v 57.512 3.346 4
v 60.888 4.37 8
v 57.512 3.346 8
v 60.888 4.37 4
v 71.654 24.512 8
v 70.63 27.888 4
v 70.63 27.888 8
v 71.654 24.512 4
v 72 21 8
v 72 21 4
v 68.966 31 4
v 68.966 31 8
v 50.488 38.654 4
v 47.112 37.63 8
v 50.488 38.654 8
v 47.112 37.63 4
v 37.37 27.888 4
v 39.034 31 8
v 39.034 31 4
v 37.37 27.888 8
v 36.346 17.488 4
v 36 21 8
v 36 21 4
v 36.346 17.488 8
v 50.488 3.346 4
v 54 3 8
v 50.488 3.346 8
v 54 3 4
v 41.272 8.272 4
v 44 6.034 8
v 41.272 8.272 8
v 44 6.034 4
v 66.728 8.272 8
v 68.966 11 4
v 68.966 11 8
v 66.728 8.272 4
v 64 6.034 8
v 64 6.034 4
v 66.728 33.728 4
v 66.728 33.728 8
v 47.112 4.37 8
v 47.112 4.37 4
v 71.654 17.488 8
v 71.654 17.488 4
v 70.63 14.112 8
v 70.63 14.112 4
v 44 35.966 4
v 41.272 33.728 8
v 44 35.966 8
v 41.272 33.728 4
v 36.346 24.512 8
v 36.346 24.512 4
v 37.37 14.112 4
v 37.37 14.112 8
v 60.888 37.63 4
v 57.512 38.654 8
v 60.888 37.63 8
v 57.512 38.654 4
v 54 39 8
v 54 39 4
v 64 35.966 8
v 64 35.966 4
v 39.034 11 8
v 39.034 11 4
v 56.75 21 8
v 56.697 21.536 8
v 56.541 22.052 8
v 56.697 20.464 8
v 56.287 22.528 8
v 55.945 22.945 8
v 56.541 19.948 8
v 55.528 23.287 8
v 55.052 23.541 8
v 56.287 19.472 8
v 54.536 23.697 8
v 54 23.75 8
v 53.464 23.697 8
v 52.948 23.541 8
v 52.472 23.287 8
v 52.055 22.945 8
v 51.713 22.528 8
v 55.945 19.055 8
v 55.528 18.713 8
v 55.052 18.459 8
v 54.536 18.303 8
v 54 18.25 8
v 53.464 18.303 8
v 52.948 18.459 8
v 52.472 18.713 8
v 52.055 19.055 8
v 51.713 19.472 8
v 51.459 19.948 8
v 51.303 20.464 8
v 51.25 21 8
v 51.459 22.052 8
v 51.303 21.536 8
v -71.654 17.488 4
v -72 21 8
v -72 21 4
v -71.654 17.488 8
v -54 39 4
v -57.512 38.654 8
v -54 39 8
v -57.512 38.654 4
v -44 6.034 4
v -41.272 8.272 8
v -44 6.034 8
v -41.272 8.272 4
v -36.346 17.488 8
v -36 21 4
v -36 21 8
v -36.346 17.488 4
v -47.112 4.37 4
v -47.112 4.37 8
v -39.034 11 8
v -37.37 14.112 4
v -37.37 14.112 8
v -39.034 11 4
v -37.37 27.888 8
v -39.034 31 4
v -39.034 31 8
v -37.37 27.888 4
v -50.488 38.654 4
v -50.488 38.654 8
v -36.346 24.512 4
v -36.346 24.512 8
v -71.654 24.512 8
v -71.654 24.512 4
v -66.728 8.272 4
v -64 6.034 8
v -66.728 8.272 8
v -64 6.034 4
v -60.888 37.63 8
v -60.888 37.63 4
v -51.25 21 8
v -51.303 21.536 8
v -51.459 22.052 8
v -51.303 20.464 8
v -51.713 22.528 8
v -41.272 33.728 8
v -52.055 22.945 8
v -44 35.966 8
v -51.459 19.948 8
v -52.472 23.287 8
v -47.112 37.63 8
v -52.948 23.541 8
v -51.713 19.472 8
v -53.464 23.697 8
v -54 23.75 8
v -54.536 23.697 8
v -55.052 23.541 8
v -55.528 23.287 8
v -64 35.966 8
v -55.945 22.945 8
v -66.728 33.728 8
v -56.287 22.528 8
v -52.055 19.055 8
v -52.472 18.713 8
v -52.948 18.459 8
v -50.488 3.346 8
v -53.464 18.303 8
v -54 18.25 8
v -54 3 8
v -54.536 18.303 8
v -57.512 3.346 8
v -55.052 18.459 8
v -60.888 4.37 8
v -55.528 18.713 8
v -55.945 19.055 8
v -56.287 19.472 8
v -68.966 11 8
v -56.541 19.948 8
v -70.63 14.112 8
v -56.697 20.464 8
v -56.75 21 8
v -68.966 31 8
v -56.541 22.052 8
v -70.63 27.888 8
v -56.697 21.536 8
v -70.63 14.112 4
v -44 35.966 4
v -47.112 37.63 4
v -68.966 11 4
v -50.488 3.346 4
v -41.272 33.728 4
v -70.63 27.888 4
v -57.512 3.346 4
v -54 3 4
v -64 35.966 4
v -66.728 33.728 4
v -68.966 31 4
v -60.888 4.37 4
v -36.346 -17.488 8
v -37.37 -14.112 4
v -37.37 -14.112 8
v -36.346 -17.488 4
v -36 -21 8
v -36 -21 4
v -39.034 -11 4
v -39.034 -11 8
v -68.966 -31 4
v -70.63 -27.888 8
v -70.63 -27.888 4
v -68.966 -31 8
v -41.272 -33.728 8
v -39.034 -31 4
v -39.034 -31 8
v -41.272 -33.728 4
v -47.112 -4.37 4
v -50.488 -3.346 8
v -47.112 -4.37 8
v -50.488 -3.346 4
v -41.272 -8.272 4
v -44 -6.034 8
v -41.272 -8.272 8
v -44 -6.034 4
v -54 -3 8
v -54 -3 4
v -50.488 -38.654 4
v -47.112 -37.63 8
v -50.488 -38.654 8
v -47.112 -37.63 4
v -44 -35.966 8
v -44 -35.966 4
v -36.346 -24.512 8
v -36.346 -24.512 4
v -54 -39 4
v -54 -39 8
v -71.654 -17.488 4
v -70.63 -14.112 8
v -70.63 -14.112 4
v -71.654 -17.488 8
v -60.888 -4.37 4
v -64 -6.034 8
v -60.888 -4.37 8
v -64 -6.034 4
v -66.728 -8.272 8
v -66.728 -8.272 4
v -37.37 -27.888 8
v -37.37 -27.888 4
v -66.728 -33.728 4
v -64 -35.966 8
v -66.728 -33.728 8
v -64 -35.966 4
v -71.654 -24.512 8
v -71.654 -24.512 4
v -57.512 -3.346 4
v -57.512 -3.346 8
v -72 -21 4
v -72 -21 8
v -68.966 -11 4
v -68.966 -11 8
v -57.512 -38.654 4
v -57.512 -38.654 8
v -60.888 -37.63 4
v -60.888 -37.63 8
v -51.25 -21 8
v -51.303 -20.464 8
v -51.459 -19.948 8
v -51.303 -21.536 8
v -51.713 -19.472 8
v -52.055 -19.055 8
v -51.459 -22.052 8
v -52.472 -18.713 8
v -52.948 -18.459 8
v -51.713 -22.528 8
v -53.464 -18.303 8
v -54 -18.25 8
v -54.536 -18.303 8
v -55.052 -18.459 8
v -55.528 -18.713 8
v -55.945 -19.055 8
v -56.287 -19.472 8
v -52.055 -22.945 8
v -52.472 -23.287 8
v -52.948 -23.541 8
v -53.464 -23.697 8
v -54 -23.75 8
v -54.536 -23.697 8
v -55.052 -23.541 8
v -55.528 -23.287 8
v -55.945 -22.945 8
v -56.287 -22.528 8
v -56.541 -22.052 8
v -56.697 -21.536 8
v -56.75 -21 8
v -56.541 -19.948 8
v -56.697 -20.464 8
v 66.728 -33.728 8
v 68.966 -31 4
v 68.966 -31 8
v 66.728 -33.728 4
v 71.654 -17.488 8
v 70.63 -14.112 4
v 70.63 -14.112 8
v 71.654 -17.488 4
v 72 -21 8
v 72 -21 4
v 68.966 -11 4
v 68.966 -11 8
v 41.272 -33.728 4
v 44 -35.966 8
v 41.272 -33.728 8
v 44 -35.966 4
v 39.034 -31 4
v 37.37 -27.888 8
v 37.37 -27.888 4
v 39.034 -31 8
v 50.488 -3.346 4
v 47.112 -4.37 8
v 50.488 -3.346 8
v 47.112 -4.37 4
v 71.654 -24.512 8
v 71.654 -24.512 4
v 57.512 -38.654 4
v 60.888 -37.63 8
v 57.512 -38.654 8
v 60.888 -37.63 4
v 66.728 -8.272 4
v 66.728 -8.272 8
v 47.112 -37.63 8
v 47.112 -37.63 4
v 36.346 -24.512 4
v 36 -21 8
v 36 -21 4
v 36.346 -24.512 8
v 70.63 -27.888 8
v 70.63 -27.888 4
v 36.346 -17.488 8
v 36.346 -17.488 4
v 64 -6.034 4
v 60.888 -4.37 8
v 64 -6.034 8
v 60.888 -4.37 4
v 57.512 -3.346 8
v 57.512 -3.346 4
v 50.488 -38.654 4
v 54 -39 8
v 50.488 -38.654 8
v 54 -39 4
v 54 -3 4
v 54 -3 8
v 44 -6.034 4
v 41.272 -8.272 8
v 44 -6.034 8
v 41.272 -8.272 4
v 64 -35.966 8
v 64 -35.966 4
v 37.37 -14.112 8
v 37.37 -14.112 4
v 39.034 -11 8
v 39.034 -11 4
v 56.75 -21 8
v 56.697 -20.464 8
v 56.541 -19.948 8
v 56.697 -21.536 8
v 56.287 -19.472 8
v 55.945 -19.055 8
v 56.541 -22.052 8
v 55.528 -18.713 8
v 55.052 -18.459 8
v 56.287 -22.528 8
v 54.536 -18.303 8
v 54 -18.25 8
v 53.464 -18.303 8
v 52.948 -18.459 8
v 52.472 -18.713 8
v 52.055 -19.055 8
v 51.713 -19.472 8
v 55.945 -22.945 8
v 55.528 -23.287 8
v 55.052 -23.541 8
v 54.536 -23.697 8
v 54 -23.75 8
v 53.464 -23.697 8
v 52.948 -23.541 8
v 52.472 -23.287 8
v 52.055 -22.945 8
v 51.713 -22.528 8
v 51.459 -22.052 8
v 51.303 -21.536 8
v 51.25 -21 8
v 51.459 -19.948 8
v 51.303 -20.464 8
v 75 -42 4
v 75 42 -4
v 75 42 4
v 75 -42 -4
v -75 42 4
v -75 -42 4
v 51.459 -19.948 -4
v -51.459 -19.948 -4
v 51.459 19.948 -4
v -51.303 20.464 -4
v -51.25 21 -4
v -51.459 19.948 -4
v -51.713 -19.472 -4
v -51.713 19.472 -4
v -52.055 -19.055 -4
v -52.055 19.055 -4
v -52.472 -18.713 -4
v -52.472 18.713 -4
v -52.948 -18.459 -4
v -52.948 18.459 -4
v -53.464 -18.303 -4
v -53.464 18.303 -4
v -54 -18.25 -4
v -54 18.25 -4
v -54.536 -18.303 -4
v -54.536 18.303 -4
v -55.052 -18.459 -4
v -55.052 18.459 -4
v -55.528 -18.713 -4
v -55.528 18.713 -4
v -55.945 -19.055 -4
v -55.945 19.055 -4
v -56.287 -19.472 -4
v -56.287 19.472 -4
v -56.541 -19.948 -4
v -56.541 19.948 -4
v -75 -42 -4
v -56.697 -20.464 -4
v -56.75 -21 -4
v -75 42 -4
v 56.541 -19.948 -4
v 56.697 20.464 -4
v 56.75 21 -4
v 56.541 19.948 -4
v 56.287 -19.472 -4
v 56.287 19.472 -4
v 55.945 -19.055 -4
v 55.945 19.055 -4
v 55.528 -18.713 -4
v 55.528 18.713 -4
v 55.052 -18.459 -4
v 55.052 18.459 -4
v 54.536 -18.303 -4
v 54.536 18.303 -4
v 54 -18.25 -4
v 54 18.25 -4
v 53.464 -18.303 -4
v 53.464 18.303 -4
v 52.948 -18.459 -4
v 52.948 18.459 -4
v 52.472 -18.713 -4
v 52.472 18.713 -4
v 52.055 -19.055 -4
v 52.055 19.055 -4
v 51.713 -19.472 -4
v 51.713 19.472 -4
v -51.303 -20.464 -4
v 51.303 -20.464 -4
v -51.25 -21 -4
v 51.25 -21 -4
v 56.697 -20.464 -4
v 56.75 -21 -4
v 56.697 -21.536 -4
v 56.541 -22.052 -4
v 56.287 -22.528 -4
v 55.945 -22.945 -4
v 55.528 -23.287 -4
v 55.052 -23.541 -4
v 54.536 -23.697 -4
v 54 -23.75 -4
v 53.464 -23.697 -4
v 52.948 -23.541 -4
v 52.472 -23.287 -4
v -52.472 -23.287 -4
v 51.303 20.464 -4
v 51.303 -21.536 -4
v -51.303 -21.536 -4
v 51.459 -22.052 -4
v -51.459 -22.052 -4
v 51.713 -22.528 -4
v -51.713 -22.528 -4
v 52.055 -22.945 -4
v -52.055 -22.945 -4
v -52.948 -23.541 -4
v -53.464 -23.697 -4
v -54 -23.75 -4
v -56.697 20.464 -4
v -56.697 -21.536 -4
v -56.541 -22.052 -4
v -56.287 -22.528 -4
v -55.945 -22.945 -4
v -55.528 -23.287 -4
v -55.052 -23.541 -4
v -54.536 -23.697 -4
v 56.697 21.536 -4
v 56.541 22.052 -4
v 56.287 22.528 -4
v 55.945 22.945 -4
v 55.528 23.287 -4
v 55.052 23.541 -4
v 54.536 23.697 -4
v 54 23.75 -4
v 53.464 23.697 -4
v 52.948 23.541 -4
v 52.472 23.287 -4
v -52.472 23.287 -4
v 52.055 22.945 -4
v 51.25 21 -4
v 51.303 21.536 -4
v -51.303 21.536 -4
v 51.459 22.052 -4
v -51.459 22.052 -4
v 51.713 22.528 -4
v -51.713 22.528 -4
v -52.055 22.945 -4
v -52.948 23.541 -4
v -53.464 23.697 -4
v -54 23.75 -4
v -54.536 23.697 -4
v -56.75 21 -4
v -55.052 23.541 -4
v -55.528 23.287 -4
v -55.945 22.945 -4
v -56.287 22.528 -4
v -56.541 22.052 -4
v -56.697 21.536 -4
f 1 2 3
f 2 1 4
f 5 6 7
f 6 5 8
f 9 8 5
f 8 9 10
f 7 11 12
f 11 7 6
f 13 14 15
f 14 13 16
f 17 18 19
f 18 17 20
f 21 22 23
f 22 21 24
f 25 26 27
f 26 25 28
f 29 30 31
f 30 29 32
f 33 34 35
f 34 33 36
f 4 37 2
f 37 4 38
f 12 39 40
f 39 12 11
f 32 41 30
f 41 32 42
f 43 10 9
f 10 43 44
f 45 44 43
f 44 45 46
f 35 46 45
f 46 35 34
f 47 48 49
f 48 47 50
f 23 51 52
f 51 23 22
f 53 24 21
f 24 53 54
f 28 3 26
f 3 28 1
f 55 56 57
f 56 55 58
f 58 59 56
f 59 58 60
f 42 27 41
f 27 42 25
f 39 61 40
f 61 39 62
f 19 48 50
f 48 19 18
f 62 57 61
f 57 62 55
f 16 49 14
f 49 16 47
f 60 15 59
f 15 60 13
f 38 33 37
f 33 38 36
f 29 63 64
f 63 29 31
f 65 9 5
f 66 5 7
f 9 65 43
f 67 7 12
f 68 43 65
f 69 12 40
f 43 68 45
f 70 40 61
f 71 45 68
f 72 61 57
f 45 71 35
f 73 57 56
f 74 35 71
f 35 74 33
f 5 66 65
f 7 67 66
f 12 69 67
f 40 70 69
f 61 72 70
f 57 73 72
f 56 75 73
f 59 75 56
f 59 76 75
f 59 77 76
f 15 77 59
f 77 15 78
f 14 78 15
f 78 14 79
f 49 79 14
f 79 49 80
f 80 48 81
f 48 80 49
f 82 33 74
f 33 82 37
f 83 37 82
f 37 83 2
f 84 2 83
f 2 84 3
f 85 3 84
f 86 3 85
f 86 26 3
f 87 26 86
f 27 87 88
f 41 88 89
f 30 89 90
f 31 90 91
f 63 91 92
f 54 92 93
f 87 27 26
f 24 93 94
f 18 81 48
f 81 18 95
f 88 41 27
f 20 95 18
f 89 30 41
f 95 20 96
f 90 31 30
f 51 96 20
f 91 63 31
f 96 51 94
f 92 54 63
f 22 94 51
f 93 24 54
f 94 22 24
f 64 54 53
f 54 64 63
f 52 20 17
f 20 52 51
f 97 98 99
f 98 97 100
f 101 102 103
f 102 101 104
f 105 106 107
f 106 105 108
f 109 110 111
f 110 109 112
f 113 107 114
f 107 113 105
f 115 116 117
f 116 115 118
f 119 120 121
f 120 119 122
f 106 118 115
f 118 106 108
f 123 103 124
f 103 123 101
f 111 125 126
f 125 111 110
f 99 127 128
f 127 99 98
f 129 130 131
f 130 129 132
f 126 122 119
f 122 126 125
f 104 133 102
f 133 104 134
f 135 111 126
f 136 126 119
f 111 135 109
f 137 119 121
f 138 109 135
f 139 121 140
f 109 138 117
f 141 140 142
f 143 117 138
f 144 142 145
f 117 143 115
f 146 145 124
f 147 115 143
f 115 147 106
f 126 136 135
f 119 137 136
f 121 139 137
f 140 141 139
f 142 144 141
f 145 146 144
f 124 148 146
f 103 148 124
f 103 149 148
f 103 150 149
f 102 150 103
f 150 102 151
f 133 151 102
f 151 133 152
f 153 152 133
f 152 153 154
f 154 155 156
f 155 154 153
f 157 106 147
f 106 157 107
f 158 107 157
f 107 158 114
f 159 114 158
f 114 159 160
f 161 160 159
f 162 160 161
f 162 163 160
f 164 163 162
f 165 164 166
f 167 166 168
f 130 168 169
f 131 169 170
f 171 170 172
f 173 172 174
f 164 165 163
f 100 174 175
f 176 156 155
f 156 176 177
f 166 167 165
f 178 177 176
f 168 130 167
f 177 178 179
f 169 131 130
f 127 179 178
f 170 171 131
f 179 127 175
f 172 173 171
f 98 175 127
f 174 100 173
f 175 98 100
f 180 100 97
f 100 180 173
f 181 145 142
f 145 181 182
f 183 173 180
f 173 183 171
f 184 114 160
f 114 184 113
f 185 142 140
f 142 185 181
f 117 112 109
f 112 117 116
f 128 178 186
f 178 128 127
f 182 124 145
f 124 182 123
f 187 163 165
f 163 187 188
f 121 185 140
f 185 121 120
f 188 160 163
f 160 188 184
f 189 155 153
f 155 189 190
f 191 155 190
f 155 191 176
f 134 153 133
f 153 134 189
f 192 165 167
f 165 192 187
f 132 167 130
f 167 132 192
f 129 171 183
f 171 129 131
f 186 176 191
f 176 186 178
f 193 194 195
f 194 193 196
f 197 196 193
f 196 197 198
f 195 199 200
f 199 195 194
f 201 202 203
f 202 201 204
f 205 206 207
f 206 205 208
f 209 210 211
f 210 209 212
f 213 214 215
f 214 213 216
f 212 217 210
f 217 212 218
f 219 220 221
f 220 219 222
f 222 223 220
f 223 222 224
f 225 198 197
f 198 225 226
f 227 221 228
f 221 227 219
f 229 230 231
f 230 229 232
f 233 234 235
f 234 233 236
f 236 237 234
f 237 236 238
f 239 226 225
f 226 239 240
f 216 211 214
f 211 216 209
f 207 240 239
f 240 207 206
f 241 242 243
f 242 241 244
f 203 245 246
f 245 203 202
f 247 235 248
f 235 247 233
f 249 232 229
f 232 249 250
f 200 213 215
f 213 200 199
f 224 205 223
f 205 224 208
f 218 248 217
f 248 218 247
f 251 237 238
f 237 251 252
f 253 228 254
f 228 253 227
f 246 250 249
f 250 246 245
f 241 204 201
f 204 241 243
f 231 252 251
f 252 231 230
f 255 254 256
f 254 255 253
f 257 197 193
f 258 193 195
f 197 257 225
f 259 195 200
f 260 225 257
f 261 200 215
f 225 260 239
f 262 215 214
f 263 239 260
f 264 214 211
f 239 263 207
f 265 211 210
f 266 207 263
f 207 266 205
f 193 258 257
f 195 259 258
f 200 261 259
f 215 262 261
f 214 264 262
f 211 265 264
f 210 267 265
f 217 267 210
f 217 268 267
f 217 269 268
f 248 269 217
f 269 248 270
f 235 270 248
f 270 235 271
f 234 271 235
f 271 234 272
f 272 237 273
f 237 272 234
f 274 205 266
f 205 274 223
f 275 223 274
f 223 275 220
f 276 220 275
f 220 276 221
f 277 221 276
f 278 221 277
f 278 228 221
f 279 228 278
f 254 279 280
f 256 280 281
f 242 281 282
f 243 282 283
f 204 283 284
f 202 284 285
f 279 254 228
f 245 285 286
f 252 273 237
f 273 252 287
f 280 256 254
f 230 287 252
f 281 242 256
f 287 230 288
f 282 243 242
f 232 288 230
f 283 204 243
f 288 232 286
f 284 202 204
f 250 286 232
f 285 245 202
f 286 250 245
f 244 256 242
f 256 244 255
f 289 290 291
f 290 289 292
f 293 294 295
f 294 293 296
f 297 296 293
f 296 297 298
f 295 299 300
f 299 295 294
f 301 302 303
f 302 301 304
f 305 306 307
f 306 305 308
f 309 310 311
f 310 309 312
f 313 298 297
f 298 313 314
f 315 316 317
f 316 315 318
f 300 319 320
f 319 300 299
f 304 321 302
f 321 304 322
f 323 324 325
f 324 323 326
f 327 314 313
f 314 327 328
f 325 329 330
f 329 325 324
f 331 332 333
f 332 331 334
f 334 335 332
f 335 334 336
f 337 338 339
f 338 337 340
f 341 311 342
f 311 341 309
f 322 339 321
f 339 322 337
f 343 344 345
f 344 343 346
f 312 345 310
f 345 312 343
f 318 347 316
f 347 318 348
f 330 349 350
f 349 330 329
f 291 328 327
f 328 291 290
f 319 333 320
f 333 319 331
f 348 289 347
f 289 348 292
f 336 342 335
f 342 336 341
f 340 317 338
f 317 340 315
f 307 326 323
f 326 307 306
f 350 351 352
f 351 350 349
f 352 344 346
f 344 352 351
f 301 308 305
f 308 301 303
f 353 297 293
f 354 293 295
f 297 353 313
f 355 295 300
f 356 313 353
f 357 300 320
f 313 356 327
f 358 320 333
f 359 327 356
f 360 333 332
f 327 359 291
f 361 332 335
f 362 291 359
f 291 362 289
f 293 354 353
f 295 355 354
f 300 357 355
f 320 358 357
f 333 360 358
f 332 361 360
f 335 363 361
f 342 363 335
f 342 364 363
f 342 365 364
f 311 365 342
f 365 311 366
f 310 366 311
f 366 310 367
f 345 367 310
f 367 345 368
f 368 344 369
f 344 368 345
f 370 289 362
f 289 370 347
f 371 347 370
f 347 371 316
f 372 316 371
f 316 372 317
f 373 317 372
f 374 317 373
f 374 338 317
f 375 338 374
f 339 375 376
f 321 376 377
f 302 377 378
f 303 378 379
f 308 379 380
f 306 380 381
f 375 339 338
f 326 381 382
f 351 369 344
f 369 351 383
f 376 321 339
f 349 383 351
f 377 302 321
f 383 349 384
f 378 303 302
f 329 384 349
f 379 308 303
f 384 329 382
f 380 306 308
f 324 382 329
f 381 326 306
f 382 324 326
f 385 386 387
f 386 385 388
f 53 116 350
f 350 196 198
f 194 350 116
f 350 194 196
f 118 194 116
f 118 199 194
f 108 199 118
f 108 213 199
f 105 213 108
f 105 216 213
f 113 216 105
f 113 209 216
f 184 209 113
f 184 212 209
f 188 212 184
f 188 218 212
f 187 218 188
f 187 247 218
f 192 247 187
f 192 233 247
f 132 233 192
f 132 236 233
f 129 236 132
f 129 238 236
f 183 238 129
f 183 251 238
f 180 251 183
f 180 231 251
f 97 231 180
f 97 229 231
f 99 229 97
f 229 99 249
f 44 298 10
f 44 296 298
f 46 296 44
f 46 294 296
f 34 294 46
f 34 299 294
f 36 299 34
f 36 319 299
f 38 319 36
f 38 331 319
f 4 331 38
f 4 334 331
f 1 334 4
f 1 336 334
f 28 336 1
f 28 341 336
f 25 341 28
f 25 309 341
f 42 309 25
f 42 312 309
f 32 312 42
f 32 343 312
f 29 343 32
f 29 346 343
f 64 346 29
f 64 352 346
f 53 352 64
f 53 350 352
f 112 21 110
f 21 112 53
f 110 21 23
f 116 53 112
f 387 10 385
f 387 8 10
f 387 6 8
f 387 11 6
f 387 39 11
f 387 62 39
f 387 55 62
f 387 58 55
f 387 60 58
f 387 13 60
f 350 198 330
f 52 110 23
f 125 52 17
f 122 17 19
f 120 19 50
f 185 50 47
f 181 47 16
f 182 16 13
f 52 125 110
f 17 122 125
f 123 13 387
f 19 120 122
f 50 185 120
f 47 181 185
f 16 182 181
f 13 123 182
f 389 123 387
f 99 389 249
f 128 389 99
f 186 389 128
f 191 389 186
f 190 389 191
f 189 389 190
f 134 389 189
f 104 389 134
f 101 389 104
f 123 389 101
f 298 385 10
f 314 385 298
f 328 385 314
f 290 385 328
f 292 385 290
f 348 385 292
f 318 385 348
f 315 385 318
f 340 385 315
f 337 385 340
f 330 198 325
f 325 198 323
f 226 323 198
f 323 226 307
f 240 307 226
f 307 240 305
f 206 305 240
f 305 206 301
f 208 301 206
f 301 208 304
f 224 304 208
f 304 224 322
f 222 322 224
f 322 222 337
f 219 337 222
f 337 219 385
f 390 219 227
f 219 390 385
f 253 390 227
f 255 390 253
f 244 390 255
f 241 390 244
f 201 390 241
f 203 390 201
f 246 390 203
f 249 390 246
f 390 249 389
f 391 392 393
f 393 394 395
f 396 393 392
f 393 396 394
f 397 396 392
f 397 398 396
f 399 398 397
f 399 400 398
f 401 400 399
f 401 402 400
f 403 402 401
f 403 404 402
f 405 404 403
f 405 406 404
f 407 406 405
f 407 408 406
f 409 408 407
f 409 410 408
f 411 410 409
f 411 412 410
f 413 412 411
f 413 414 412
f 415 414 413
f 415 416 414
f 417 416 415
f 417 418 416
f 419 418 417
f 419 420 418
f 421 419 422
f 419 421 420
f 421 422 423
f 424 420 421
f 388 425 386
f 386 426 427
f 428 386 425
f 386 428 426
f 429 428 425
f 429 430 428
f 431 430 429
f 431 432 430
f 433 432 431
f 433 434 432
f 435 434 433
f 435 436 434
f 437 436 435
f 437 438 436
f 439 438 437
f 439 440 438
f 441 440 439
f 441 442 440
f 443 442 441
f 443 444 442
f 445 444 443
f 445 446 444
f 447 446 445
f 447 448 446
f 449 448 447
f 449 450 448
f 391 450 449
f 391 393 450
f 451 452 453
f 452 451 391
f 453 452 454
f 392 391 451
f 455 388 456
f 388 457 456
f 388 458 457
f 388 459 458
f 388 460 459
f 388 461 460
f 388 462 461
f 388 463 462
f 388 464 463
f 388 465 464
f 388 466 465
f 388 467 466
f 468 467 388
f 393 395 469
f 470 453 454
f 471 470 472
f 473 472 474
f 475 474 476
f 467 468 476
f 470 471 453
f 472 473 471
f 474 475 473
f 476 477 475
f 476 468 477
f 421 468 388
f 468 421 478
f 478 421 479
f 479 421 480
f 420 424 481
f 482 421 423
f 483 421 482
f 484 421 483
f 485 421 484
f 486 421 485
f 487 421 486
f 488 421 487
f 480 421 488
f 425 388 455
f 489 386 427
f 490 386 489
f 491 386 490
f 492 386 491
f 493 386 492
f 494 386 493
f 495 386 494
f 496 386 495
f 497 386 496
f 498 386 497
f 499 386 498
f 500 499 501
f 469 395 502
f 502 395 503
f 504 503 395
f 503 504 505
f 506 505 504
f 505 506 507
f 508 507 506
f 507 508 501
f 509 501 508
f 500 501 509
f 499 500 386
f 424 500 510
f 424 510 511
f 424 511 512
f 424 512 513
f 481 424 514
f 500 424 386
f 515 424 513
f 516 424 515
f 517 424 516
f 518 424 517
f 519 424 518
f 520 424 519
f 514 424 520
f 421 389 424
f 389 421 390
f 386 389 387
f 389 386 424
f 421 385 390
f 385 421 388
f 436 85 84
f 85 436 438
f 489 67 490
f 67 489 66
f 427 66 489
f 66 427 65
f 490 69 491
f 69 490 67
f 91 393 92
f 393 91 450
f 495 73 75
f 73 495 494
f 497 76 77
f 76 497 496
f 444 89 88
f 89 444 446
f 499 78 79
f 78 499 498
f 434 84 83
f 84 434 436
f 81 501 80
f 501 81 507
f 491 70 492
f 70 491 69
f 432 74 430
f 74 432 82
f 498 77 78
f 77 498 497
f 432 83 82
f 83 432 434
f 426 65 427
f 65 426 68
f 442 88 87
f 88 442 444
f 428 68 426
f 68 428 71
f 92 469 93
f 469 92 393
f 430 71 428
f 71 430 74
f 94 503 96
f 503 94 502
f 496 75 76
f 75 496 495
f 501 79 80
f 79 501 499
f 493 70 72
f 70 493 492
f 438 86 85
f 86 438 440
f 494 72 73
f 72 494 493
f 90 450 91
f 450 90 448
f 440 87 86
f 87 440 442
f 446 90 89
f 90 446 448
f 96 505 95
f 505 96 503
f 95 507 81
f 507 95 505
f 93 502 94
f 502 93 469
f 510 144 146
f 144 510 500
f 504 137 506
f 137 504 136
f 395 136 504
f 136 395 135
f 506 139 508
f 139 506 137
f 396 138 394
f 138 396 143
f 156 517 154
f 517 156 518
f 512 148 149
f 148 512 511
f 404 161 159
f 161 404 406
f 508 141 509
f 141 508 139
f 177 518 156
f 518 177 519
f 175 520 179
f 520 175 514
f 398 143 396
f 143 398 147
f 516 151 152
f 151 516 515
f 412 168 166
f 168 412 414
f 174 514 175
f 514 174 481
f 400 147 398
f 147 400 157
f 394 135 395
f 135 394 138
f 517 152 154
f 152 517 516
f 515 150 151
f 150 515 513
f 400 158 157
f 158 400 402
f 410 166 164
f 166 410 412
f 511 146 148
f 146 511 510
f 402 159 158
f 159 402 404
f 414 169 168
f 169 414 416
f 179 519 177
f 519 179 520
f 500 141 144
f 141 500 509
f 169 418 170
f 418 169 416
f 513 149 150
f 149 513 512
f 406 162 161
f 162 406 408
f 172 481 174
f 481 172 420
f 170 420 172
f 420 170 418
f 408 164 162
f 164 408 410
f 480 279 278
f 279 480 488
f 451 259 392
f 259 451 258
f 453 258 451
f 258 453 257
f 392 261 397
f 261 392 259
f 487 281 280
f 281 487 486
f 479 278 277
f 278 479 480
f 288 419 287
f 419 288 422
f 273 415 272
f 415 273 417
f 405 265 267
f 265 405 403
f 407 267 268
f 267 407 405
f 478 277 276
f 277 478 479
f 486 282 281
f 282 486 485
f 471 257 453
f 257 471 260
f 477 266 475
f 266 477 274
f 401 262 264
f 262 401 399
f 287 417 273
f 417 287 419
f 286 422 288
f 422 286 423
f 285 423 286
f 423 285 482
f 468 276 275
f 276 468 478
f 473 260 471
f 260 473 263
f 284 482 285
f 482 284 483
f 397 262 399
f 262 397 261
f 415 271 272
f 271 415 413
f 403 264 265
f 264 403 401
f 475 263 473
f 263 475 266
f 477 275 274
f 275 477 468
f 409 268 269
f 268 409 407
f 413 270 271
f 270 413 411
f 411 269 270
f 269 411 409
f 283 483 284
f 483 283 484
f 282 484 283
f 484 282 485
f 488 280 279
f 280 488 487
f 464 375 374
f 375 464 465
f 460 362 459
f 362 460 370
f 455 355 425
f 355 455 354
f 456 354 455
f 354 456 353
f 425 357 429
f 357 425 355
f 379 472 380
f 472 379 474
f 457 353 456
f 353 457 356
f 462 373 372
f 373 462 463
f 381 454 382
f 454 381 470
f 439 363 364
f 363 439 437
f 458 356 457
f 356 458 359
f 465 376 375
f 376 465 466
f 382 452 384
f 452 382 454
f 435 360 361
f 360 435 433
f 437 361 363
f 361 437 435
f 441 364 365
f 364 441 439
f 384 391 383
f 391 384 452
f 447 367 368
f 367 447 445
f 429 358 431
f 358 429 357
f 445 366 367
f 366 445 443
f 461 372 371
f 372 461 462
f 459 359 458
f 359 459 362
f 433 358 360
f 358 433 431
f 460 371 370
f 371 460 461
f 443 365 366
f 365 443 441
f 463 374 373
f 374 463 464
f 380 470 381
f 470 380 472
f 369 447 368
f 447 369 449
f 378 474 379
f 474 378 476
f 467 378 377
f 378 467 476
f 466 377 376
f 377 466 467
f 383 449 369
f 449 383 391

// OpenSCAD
$fn = 32;

// ----------------------------------------------------------------------
// Anchor pads 150 x 84 x 12
// four corner bosses with anchor holes
// ----------------------------------------------------------------------

// --- parameters (mm) ---
plate = [150, 84, 8];  // base plate size (x, y, z)
pads = 4;              // boss count, one per corner
edge = 21;             // boss centre offset from the plate edge
boss_d = 36;           // boss diameter
boss_h = 4;            // boss height above the base plate
hole_d = 5.5;          // hole diameter

// --- derived feature positions (mm) ---
height = plate[2] + boss_h;      // = 12   overall height of the part
corner_x = plate[0] / 2 - edge;  // = 54   boss centre X
corner_y = plate[1] / 2 - edge;  // = 21   boss centre Y
feature_centers = [
  [corner_x, corner_y],
  [-corner_x, corner_y],
  [-corner_x, -corner_y],
  [corner_x, -corner_y]
];   // boss centres, anchor holes are drilled there

// base plate, four bosses standing on it, anchor holes all the way through
difference() {
  union() {
    cube(plate, center = true);
    for (centre = feature_centers)
      translate([centre[0], centre[1], plate[2] / 2 - 1])
        cylinder(d = boss_d, h = boss_h + 1);
  }
  for (centre = feature_centers)
    translate([centre[0], centre[1], -height])
      cylinder(d = hole_d, h = 2 * height + 2);  // through boss and plate
}
